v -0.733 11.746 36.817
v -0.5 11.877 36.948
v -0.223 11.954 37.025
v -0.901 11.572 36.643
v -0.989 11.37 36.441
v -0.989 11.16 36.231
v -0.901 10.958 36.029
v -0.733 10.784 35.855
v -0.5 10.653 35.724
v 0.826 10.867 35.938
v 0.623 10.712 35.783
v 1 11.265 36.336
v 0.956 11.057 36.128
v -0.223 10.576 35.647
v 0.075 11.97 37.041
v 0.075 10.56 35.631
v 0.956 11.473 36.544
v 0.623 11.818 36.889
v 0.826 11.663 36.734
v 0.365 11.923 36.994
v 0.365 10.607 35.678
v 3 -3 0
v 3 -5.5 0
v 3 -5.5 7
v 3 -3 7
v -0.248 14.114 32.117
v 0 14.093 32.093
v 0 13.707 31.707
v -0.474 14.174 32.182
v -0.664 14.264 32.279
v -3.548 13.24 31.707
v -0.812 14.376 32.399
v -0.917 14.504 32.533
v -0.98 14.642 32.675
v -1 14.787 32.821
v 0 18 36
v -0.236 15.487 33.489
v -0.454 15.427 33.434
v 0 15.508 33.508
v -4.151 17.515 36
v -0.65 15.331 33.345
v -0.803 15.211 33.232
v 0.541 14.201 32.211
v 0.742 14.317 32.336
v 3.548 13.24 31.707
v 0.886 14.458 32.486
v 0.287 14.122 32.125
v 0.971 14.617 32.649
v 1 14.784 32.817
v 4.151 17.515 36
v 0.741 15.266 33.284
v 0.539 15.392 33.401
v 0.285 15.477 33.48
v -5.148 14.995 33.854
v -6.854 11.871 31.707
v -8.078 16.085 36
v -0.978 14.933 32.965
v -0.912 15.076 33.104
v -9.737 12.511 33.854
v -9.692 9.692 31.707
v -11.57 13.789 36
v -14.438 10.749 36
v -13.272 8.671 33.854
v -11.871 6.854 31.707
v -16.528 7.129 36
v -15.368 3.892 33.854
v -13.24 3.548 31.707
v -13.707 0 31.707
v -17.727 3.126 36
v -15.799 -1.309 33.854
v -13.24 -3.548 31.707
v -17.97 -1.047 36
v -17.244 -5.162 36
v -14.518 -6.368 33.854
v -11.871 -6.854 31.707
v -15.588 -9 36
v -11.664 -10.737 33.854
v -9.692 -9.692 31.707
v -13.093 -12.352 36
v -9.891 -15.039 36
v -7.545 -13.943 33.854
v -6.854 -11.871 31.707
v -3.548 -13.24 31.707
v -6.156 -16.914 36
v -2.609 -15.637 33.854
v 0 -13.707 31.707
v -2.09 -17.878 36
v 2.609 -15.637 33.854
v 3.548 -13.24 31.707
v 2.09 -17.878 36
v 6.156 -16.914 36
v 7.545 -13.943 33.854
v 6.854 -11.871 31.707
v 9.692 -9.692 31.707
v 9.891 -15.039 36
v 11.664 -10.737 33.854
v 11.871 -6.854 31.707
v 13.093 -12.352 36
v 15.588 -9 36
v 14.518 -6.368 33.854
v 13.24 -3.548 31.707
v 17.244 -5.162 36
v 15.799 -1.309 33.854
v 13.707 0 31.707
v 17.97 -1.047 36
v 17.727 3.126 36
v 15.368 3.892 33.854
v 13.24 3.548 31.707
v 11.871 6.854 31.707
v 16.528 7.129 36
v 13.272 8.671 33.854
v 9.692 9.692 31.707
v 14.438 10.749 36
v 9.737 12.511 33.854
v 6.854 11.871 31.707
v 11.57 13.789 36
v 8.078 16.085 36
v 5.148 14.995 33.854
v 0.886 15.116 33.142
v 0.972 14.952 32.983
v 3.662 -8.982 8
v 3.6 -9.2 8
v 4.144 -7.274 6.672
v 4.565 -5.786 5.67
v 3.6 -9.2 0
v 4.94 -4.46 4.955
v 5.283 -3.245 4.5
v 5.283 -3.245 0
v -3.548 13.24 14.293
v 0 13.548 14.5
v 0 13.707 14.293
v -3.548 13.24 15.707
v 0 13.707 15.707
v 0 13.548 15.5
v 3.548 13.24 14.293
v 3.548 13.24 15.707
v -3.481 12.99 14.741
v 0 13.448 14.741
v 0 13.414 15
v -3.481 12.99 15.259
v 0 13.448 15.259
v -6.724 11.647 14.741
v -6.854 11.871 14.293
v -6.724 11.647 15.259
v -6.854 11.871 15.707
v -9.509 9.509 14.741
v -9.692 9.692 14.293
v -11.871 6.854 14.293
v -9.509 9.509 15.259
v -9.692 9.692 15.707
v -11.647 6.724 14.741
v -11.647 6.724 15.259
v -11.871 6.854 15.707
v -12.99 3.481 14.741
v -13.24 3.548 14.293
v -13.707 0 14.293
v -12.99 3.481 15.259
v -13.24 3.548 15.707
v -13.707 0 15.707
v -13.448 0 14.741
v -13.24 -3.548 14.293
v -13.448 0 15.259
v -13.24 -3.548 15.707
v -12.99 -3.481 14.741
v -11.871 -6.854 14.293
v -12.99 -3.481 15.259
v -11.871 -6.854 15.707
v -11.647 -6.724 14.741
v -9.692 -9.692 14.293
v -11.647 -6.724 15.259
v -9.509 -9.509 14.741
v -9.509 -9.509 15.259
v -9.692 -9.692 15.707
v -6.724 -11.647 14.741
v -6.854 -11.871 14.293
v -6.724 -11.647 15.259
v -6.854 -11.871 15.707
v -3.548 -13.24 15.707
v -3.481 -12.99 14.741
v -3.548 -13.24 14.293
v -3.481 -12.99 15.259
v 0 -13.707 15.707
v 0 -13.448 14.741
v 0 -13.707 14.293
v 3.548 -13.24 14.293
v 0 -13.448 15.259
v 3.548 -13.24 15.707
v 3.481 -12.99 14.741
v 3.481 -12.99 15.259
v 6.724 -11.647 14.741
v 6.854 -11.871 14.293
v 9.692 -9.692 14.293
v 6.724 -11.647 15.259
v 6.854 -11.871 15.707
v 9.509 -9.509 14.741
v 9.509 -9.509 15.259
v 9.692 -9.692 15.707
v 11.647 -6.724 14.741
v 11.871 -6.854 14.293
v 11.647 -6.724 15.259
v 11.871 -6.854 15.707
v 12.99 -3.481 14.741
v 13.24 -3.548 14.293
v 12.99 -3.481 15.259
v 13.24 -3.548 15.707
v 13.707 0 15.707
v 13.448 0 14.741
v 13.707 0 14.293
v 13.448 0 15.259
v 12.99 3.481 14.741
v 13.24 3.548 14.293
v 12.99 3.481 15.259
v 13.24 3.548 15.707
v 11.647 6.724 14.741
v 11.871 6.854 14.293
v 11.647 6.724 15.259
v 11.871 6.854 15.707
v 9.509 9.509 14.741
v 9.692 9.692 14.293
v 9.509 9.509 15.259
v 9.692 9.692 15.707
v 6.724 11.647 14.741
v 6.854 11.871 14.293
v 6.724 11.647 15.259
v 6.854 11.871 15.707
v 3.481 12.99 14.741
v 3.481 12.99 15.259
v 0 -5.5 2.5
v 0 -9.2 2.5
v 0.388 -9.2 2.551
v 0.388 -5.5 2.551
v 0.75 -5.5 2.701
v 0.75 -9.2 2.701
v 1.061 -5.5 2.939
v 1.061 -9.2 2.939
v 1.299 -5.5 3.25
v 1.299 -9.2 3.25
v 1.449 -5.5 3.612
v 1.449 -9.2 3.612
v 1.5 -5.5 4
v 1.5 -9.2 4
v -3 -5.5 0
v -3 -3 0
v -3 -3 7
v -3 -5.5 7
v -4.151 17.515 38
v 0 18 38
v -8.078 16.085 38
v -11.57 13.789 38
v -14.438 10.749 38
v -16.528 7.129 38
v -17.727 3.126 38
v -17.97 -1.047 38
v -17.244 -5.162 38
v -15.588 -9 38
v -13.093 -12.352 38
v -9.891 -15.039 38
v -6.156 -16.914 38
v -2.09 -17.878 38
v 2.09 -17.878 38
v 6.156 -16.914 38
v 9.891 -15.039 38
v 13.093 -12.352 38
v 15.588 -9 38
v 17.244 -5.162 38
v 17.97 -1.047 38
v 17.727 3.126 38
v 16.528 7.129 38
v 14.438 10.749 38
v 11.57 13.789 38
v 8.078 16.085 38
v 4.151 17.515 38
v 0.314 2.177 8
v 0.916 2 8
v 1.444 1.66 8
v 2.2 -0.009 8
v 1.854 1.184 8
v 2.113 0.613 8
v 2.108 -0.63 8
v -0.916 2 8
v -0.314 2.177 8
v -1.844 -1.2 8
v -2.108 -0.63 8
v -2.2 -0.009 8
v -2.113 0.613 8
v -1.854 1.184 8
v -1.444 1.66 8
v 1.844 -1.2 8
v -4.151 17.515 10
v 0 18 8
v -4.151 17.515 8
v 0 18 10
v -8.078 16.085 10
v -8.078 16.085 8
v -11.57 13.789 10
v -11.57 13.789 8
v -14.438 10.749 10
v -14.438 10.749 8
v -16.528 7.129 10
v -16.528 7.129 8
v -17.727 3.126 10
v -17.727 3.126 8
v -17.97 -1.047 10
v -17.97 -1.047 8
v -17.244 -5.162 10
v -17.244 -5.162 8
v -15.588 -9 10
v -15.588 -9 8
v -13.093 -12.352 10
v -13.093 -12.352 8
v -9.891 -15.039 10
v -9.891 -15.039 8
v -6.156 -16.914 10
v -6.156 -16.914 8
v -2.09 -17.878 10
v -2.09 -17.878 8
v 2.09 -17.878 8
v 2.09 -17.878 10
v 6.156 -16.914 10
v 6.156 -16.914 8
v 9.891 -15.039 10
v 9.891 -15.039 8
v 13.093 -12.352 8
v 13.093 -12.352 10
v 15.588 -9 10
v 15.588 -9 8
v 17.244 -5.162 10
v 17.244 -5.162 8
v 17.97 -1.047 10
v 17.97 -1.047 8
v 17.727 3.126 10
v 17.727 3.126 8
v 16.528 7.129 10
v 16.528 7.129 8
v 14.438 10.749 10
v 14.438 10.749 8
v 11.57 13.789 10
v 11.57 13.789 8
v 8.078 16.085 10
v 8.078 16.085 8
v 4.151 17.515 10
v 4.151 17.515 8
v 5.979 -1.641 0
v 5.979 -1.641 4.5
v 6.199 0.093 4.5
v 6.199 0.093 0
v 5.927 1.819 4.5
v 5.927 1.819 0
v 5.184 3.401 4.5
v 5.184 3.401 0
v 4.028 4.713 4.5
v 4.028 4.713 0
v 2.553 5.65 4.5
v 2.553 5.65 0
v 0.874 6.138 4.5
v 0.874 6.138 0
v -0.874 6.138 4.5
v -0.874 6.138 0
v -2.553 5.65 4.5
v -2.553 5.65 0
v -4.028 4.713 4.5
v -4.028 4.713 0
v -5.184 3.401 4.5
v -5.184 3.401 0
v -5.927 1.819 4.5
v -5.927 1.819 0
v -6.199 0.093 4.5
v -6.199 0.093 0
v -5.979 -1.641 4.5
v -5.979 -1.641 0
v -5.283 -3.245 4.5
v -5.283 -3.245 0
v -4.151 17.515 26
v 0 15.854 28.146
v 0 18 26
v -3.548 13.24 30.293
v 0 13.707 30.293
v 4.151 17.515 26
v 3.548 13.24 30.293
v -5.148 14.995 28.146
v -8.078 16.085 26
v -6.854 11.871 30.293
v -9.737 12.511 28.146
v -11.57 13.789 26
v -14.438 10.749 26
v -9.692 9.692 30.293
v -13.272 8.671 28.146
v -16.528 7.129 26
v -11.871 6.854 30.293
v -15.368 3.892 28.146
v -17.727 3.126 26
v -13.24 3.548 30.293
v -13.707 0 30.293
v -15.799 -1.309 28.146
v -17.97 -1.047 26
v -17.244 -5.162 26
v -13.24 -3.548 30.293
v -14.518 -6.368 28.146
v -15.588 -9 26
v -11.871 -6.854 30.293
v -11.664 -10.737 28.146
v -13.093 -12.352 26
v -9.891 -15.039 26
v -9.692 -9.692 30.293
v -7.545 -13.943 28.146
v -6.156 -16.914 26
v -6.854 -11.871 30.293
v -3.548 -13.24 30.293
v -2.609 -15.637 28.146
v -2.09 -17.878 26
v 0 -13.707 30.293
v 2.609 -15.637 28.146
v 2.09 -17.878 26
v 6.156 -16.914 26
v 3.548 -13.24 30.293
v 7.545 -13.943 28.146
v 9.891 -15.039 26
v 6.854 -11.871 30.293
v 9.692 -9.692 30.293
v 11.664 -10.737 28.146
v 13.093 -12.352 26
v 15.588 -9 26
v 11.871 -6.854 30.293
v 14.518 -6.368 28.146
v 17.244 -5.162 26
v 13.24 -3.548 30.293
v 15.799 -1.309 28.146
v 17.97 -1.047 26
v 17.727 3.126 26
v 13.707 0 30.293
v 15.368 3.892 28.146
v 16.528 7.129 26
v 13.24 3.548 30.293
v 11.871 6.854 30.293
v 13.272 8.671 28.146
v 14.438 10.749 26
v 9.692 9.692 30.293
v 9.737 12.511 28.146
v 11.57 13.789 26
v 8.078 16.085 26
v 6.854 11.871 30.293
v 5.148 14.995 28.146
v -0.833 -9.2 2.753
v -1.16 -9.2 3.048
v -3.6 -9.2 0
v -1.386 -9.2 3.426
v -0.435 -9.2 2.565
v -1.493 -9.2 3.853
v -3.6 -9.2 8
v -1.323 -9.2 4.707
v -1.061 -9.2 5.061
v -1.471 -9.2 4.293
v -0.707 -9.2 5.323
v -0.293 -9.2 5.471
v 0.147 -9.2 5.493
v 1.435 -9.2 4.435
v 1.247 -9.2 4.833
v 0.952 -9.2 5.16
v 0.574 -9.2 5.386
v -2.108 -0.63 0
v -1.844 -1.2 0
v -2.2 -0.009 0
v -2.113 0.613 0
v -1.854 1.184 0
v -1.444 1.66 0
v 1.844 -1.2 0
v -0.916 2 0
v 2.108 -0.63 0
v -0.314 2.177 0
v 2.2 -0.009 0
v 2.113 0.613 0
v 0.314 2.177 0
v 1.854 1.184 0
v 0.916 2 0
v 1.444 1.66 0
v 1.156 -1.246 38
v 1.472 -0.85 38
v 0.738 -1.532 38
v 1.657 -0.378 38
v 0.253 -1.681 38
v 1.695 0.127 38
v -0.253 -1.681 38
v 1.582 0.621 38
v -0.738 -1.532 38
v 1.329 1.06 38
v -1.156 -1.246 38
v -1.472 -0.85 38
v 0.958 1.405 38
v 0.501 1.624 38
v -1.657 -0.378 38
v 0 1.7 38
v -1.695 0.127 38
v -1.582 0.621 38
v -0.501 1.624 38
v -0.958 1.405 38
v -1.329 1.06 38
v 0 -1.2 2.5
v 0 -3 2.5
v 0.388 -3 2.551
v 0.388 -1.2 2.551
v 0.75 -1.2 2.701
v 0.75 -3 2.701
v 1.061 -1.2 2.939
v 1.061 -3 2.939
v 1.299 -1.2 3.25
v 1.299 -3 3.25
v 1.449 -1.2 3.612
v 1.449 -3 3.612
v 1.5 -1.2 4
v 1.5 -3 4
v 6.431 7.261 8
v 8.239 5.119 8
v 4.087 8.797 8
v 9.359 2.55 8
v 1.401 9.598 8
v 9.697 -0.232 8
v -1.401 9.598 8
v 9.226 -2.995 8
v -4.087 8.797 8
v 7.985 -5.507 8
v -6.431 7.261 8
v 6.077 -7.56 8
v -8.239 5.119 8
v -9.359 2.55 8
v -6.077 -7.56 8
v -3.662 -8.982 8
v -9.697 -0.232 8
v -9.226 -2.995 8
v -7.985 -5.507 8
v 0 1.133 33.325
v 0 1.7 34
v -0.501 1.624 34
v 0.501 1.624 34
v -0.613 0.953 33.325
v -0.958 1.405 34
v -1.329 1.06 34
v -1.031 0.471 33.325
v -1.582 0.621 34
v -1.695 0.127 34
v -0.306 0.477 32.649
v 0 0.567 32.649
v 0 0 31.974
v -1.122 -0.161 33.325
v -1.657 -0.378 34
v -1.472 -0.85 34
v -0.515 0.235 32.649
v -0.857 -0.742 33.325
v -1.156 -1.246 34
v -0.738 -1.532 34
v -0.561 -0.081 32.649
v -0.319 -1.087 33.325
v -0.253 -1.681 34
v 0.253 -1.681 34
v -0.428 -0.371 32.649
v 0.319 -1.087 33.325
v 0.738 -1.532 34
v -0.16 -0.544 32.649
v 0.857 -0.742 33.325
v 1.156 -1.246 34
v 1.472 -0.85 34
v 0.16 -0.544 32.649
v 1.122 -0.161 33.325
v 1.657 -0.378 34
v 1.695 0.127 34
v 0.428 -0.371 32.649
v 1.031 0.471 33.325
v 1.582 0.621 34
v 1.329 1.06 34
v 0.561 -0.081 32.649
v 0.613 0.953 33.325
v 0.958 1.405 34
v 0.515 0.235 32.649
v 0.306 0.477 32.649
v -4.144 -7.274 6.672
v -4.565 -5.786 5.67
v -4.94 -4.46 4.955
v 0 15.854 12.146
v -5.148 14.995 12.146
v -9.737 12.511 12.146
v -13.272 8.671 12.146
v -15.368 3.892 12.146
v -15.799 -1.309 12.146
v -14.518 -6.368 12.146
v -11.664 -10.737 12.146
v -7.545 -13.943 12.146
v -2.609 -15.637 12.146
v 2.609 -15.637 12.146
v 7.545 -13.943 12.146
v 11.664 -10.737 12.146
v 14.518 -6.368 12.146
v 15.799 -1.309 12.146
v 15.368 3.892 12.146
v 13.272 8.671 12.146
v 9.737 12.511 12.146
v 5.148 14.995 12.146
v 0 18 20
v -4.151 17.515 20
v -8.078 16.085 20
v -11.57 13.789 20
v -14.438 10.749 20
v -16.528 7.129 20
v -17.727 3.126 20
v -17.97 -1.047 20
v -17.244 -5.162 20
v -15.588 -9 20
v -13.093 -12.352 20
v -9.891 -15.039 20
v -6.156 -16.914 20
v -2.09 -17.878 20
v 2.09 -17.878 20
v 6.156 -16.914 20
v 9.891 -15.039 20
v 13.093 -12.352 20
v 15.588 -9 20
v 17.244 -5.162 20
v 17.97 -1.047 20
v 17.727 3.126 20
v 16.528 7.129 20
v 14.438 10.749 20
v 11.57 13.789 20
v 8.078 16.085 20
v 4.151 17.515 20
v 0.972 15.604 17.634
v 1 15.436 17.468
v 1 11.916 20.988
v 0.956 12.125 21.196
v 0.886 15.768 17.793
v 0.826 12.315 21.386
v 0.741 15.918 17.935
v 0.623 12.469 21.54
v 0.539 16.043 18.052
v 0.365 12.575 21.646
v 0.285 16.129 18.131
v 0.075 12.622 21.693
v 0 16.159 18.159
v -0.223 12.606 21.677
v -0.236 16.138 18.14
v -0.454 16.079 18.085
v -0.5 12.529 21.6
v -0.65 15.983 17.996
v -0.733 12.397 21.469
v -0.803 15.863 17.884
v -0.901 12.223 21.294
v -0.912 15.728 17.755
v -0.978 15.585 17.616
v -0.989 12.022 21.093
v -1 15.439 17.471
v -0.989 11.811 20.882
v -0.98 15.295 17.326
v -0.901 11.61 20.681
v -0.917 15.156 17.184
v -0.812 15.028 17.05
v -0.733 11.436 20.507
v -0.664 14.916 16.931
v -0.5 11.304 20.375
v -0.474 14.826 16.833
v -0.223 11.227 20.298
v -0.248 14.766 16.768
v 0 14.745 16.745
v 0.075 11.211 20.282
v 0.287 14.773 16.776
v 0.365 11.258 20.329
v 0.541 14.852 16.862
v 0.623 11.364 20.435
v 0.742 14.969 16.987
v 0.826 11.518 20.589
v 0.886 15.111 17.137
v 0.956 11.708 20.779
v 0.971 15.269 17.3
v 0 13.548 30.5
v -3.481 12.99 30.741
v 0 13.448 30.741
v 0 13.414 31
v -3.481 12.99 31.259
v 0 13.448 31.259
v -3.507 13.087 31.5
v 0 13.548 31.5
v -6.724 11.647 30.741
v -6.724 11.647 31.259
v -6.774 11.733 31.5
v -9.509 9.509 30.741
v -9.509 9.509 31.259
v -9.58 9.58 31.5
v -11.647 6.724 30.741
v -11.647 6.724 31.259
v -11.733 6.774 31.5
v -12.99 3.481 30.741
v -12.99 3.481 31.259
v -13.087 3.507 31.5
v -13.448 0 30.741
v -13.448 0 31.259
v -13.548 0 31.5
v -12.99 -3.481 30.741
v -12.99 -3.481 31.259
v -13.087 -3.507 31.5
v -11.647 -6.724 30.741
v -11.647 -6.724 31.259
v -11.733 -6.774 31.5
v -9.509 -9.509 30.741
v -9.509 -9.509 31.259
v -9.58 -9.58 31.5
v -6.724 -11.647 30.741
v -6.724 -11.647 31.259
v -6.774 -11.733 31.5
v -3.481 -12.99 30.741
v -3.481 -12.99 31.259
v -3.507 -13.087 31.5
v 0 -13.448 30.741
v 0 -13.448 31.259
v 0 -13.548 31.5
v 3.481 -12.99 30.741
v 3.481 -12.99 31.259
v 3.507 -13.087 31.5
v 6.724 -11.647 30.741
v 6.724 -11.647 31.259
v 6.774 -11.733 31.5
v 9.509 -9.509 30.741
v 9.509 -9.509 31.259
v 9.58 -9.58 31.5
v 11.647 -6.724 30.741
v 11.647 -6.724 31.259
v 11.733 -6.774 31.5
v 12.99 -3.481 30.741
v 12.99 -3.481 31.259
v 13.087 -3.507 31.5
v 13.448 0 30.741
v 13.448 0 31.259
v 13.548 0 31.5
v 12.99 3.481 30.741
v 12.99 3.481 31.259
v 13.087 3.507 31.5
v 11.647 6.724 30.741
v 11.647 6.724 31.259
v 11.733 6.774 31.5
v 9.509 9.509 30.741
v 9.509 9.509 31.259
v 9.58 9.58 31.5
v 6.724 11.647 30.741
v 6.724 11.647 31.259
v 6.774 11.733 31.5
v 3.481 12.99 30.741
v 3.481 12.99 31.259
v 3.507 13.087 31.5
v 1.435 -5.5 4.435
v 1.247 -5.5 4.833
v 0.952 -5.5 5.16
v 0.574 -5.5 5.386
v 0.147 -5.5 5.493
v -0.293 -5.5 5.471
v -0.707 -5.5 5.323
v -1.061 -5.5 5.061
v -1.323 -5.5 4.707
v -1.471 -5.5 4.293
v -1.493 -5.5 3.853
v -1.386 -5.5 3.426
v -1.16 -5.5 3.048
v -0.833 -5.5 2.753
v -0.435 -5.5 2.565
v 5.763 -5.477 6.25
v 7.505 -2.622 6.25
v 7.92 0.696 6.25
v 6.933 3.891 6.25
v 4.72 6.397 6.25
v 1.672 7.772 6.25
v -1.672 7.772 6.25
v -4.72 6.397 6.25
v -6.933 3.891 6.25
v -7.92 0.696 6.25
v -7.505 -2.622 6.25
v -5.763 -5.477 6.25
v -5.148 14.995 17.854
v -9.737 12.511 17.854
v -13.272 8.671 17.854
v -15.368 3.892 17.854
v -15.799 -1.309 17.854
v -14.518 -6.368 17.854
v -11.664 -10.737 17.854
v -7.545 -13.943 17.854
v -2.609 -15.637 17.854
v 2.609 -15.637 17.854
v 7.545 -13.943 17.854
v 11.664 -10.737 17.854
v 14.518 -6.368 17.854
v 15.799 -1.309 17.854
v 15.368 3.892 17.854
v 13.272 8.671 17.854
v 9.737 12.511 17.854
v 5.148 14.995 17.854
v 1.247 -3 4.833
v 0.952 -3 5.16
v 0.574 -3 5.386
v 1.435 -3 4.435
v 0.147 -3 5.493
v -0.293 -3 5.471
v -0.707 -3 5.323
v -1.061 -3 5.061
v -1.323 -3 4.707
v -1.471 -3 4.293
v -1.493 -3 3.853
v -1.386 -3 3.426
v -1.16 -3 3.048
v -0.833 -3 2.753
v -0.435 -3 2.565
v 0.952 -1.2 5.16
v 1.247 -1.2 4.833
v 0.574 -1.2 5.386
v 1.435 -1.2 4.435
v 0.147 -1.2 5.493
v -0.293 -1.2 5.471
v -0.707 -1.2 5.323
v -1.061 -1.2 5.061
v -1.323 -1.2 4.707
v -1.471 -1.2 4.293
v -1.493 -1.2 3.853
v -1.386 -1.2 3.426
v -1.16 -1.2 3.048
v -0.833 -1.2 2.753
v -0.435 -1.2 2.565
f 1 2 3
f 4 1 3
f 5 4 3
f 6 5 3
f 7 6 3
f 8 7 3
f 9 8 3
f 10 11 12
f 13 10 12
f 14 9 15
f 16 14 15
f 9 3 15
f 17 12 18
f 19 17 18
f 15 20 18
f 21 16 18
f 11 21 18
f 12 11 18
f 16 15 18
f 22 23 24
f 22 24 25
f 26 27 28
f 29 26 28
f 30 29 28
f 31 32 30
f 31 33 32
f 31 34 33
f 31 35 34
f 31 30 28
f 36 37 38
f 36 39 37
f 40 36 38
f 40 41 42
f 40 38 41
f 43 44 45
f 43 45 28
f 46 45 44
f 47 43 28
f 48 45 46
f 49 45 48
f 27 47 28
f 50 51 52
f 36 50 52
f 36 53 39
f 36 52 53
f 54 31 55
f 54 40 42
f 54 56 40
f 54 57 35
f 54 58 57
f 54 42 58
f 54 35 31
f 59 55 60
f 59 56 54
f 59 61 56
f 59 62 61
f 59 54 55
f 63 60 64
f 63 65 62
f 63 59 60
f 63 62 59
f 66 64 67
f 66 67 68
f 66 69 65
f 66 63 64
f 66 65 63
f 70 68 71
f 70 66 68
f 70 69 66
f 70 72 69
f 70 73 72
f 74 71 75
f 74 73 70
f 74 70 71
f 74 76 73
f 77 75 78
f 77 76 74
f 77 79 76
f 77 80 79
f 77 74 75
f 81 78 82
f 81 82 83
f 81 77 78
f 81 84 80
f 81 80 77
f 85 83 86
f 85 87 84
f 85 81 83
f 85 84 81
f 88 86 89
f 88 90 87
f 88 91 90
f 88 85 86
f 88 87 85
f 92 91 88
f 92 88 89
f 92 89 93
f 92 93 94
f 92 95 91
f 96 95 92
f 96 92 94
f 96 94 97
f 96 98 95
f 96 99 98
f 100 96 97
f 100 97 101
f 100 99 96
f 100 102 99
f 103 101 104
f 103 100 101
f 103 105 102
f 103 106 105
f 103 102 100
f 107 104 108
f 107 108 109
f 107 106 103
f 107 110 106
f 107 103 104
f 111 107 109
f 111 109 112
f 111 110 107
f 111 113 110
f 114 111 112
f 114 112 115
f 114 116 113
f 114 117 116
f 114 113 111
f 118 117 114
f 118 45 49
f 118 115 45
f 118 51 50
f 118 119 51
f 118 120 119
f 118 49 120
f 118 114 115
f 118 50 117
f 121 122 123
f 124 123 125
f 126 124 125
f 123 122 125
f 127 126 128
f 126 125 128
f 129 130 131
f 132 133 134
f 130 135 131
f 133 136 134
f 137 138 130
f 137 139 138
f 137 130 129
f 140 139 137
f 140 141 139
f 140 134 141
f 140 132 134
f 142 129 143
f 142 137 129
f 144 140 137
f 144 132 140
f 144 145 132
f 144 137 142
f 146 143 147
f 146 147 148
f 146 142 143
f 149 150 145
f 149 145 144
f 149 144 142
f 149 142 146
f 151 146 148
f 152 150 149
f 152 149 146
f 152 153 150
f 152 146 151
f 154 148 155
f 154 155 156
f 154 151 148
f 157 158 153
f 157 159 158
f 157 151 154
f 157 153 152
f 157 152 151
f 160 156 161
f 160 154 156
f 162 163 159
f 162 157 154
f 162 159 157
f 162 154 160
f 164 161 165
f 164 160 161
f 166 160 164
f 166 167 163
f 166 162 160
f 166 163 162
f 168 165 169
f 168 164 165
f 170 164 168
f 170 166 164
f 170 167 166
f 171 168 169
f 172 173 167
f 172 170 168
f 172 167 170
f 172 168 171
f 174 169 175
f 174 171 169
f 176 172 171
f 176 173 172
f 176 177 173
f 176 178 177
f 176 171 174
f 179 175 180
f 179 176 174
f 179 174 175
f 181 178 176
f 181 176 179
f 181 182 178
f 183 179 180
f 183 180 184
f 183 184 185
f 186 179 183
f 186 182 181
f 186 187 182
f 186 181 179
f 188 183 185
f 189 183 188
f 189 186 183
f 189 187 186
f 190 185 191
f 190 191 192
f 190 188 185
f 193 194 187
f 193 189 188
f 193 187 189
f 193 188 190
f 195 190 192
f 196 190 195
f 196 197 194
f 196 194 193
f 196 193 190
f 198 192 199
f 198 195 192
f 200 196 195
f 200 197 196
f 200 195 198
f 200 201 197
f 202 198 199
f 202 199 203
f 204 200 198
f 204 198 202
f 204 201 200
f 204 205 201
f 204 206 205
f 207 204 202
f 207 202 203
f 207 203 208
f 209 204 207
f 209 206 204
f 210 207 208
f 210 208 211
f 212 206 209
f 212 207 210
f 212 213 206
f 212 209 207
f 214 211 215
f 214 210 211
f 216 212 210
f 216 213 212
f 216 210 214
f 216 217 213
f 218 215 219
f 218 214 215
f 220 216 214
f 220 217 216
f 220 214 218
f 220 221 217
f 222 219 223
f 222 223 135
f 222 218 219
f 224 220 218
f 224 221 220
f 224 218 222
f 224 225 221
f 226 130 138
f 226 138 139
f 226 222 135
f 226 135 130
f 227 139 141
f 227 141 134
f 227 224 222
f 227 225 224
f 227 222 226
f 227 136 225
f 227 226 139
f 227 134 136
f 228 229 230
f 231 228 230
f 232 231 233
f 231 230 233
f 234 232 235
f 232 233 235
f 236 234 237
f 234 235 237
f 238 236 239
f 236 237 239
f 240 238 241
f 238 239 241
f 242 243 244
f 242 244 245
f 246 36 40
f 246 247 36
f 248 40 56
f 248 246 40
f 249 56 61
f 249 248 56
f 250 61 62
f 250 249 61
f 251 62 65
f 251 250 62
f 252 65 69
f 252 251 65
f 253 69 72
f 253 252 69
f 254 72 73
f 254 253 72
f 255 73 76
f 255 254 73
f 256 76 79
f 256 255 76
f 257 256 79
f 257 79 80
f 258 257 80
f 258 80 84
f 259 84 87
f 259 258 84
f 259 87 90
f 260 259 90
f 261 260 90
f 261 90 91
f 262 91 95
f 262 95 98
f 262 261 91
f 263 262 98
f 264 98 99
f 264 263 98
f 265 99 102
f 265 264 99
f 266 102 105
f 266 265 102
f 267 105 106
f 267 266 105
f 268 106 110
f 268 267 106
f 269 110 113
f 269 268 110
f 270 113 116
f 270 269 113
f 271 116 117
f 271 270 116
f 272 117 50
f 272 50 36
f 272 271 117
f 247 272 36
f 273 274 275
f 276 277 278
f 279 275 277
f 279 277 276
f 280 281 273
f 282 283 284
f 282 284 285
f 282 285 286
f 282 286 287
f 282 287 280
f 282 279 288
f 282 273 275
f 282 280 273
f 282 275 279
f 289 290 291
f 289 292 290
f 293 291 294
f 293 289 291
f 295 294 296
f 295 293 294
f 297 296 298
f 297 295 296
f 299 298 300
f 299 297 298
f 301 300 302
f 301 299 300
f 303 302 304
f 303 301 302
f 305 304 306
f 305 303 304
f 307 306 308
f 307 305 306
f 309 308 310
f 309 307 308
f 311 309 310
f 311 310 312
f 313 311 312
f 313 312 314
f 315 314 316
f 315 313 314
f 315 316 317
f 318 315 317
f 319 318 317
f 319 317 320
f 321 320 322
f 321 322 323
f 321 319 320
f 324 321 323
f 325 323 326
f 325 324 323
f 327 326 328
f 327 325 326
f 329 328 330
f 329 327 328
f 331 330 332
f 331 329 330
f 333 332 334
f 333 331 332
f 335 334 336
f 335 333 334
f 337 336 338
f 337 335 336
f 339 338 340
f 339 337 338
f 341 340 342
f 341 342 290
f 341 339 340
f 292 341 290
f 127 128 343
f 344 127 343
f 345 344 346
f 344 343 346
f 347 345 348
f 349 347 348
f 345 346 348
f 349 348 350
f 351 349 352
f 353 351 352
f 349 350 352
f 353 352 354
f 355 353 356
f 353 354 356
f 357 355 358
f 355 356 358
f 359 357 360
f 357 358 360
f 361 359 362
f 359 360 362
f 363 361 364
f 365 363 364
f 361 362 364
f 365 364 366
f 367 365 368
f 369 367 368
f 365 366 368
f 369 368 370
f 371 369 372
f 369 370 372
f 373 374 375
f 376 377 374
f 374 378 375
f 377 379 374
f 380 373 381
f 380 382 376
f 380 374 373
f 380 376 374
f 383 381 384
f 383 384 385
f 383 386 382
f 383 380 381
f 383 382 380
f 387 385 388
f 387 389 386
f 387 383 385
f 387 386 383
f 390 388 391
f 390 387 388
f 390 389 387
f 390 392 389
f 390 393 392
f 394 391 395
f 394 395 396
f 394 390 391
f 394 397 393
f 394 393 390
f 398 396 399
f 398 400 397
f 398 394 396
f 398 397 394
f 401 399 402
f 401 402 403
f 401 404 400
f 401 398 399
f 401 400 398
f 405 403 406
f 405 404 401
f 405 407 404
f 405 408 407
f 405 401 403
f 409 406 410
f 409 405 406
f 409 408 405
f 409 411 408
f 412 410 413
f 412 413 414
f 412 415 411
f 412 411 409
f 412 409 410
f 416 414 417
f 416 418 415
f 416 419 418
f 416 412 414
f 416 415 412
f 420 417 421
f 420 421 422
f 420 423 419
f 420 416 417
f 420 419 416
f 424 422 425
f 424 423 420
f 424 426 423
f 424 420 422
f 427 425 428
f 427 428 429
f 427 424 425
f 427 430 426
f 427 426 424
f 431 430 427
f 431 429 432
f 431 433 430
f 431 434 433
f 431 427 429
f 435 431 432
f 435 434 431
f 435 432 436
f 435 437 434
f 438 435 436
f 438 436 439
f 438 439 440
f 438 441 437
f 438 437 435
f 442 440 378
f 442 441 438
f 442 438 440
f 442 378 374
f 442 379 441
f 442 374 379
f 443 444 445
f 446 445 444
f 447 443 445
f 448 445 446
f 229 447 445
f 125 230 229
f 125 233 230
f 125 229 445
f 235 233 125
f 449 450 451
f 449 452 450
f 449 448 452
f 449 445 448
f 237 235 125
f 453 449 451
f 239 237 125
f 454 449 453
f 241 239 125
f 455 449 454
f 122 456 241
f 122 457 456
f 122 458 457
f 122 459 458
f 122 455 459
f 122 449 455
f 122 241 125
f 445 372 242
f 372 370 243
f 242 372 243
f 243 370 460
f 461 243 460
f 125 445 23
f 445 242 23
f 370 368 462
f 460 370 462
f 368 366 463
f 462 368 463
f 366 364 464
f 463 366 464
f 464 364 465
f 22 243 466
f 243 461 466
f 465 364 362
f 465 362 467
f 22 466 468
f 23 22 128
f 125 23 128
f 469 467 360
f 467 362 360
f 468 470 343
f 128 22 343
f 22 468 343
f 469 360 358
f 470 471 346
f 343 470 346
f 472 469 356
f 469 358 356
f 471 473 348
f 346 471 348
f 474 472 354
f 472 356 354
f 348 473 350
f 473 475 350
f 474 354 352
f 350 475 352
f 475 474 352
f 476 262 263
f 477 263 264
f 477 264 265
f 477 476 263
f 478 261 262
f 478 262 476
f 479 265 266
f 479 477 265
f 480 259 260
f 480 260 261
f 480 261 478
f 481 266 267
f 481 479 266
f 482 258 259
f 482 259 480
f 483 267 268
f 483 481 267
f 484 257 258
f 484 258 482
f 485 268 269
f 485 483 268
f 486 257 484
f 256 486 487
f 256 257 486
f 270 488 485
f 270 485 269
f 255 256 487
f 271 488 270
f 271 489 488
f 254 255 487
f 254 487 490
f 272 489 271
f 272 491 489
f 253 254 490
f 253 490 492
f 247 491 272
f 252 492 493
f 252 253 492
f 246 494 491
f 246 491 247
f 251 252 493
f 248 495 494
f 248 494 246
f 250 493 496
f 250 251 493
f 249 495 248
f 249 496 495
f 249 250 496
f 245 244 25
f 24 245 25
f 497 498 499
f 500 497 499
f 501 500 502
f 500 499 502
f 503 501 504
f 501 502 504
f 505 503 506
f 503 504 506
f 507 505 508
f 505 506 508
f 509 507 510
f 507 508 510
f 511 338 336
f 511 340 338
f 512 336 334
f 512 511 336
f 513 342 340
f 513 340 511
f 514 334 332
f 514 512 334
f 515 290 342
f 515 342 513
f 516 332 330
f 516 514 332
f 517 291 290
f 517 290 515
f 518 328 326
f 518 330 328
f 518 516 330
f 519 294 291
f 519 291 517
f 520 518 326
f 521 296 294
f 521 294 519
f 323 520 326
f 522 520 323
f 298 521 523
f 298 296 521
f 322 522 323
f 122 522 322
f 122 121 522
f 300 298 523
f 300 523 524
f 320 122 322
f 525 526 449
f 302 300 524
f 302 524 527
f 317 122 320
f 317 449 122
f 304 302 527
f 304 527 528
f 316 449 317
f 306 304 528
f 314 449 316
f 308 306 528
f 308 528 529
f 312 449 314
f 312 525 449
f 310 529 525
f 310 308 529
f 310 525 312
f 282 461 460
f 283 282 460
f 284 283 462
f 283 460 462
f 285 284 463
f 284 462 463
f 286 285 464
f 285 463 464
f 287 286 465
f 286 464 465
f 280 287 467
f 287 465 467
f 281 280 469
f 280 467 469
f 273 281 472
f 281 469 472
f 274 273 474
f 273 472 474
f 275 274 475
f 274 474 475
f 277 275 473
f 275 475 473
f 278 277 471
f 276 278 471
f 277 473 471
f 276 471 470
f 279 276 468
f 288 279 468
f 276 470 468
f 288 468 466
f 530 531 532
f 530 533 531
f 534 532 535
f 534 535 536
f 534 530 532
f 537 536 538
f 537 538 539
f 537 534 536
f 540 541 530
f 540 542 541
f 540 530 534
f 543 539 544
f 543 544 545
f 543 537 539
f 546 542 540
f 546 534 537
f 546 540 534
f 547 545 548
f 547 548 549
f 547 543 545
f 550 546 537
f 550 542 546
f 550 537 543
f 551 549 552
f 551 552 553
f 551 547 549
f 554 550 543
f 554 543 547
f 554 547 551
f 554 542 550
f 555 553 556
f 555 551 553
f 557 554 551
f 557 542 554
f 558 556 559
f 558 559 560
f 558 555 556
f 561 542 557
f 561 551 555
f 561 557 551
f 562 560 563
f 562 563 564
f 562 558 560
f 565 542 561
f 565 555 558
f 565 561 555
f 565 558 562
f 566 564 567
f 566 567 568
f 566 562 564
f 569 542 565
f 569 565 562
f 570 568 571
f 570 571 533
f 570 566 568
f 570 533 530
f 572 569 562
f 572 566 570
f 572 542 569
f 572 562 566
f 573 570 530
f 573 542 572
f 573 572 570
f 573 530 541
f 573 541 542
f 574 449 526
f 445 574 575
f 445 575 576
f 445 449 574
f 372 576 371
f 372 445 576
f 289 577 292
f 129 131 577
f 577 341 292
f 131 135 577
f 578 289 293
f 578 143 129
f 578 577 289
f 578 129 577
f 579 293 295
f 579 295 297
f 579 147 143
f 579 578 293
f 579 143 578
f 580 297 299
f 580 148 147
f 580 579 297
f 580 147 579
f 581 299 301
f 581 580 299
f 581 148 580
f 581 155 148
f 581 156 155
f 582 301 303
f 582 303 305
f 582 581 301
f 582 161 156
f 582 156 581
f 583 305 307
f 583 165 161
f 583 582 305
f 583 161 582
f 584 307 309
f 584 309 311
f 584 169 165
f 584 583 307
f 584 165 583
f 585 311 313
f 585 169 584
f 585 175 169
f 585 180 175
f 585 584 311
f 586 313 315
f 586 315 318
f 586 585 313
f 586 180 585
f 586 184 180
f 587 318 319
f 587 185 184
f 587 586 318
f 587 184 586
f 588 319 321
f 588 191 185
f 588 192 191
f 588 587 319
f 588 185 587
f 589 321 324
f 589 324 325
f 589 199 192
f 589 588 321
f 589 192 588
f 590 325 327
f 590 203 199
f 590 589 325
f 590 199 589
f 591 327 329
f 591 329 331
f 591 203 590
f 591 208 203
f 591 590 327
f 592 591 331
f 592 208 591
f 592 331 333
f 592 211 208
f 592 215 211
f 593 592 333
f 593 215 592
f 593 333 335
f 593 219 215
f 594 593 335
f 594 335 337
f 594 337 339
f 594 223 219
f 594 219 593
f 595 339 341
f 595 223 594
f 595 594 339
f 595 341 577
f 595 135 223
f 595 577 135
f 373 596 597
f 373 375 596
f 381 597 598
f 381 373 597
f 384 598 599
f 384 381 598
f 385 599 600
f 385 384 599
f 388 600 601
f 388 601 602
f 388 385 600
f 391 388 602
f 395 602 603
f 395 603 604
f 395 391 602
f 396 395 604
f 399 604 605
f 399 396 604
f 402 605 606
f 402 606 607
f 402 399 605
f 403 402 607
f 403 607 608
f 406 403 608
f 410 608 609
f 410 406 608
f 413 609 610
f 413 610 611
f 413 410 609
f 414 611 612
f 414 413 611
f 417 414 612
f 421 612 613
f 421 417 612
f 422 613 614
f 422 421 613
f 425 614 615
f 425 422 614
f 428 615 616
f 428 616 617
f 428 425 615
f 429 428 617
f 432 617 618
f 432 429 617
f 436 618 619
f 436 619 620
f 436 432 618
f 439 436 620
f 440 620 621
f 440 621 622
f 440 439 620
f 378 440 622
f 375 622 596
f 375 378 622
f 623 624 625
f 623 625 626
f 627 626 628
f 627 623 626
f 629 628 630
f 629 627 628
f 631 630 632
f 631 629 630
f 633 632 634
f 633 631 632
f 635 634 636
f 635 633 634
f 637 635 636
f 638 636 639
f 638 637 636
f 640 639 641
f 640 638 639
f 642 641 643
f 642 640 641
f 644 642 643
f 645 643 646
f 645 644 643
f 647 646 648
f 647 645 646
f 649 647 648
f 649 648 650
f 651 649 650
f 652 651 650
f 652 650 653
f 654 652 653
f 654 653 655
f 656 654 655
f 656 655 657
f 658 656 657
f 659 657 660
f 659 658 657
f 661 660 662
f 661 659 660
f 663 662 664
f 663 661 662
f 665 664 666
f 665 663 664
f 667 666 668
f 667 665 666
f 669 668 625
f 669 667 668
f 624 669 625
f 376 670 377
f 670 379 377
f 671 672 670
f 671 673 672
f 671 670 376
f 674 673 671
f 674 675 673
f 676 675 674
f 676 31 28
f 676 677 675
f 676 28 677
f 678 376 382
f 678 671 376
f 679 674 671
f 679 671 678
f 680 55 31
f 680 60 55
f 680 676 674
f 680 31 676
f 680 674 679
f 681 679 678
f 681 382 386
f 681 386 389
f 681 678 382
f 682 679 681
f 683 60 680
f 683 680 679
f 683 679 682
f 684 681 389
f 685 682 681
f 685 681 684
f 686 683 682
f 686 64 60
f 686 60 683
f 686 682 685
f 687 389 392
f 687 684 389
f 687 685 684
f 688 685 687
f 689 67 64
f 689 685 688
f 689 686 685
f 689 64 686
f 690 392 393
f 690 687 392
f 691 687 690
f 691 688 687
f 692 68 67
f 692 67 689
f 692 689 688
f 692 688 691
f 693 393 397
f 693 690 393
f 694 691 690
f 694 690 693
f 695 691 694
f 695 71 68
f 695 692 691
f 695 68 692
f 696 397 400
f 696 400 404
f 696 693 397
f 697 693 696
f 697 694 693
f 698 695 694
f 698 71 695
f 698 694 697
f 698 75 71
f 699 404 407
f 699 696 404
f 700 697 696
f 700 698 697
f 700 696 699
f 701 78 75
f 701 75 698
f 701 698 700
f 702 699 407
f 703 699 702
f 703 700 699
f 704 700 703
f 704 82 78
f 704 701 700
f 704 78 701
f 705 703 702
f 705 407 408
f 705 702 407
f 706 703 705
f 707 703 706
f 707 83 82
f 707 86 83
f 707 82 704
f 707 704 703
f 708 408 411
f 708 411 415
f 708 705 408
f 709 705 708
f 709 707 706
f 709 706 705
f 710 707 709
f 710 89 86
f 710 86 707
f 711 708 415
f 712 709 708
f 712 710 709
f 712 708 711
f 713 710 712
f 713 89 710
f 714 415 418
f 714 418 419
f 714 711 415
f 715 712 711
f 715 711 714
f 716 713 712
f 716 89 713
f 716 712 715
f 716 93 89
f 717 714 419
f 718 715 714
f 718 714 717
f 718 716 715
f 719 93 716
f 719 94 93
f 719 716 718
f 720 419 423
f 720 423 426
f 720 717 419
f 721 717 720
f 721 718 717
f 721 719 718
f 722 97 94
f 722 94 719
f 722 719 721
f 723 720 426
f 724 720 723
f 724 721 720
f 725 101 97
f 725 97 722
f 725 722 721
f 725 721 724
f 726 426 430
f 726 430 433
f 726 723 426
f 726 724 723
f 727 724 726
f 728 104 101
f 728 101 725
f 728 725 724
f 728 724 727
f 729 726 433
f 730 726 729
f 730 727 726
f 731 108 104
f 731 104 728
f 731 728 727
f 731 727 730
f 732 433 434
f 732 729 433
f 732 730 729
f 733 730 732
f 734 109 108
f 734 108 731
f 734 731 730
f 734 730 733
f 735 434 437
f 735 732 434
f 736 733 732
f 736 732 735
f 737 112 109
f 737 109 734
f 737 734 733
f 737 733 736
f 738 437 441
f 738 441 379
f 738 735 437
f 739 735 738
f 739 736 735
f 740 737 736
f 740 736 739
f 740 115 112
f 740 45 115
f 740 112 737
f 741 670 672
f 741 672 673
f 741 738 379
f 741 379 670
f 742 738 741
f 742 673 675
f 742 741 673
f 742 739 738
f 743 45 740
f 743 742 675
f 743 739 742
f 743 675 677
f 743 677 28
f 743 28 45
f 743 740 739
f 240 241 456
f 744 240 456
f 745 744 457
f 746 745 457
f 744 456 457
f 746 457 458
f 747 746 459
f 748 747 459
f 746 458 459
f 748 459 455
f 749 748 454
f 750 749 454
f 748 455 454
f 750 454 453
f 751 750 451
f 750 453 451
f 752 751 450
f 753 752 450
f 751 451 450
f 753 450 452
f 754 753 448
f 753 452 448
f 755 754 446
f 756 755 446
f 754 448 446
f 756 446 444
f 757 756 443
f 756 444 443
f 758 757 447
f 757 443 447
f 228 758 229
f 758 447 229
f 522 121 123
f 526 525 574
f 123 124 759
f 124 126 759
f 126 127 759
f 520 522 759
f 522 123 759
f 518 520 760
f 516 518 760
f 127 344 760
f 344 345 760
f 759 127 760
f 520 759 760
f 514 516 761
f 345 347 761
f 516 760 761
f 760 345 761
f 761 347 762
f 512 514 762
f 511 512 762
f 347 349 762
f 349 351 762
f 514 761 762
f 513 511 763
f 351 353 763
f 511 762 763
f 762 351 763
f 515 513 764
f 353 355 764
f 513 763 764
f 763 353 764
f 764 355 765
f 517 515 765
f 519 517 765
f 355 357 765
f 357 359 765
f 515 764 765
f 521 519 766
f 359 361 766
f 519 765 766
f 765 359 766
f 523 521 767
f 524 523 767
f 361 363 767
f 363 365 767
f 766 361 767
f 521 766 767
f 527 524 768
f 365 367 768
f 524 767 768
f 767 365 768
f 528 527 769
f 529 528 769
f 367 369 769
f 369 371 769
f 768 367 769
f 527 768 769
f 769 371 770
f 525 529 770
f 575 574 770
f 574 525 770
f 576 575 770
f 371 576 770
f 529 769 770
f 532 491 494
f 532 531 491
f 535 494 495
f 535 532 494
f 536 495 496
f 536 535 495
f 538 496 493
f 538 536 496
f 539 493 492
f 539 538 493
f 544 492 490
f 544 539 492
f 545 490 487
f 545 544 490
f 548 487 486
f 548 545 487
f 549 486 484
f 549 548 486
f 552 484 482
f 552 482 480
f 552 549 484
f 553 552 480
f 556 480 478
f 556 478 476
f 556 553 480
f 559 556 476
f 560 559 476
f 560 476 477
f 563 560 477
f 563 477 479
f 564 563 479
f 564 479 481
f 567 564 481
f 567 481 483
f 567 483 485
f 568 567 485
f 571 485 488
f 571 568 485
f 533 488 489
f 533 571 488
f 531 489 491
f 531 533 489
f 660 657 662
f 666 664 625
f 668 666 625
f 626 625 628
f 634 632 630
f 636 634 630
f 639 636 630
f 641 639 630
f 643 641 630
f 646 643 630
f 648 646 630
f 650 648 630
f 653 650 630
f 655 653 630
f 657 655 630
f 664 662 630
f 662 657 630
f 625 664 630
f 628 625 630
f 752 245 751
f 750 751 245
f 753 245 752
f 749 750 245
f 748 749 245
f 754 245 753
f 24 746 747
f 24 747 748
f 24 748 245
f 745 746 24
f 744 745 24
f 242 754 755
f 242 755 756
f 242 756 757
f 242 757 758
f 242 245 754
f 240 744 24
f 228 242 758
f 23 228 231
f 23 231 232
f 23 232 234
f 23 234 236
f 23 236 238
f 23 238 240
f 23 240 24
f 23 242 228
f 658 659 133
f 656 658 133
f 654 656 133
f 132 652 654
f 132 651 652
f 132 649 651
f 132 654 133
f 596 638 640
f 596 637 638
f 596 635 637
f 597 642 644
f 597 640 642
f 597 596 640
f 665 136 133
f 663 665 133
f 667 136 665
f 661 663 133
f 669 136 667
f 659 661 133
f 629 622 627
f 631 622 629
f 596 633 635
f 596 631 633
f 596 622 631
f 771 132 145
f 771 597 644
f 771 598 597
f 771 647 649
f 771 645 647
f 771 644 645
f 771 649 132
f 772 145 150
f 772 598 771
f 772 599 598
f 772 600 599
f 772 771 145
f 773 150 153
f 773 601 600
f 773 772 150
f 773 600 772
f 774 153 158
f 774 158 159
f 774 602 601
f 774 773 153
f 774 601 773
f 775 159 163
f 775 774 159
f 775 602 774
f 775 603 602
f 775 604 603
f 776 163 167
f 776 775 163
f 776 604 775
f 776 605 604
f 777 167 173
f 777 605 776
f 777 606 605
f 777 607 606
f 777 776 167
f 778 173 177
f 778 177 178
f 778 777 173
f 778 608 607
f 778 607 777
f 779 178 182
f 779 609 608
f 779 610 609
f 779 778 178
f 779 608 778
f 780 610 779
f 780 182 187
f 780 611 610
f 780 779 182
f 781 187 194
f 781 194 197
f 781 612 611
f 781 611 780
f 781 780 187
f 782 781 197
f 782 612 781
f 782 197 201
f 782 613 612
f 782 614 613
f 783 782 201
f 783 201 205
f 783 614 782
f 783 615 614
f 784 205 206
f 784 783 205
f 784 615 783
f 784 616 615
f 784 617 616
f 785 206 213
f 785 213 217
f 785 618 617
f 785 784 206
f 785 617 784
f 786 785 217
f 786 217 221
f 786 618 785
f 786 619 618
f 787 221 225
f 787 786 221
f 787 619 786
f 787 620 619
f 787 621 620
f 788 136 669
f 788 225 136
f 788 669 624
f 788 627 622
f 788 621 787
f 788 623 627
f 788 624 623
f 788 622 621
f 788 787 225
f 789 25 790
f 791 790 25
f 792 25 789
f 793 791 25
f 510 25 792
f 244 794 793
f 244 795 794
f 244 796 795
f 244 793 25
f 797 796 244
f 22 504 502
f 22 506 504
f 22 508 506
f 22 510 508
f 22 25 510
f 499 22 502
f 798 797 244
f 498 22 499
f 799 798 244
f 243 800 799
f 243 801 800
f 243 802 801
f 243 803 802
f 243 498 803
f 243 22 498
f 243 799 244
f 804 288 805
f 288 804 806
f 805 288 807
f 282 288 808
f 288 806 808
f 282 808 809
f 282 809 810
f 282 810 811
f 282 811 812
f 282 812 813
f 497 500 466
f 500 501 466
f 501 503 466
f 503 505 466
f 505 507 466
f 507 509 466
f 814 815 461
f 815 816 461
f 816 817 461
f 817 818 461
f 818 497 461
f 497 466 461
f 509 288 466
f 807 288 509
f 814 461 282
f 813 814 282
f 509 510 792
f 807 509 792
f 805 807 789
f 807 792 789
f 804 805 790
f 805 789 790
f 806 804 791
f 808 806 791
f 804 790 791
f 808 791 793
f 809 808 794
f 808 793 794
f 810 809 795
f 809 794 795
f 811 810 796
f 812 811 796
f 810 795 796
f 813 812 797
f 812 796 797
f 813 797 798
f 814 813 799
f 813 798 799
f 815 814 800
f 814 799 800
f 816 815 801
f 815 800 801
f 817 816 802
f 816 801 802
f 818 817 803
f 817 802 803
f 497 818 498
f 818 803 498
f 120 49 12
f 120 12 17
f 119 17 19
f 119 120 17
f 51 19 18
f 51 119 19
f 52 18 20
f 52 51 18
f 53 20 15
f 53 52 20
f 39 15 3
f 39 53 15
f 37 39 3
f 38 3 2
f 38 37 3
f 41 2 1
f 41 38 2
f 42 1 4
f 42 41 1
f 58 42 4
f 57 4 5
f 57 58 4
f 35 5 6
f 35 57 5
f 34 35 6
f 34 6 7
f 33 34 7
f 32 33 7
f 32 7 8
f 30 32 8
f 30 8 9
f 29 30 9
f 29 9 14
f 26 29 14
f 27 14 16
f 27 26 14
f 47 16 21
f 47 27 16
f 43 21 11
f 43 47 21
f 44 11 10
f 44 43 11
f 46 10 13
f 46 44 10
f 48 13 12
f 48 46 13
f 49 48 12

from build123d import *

# Parameters (mm, degrees)
F1_DEPTH     = 8
F3_W         = 6.7527772065
F3_H         = 8
F4_DEPTH     = 4
F8_DEPTH     = 7
F9_T4_DEPTH  = 8
F9_T9_DEPTH  = 20.6550440955
F9_T15_DEPTH = 20.6550440955
F9_T21_DEPTH = 8
F9_T26_DEPTH = 20.6550440955
F9_T32_DEPTH = 20.6550440955
F12_DEPTH    = 8
F13_SIZE     = 3.5
F16_R        = 1
F17_DEPTH    = 5
F20_R        = 1
F21_DEPTH    = 5


# Not quite as in the source:
# - a fillet or chamfer that OpenCascade refuses, or shapes differently, is made with other operations: its cross-section is extruded or revolved along the edge and cut away or added


with BuildPart() as f1:
    # F0 (on Top) → F1 (new body)
    with BuildSketch(Plane.XY):
        with BuildLine():
            Line((-3.3763886032, -5.2), (3.3763886032, -5.2))
            ThreePointArc((3.3763886032, -5.2), (0, 6.2), (-3.3763886032, -5.2))
        make_face()
        with BuildLine():
            ThreePointArc((-1.8439088915, -1.2), (0, 2.2), (1.8439088915, -1.2))
            Line((1.8439088915, -1.2), (-1.8439088915, -1.2))
        make_face(mode=Mode.SUBTRACT)
    extrude(amount=F1_DEPTH)

    # F3 (on offset) → F4 (join)
    with BuildSketch(Plane.XZ.offset(5.2)):
        with Locations((0, 4)):
            Rectangle(F3_W, F3_H)
    extrude(amount=F4_DEPTH)

    # F6 (on Right) → F7 (revolve)
    with BuildSketch(Plane.YZ):
        with BuildLine():
            Line((18, 36), (18, 38))
            Line((18, 38), (1.7, 38))
            Line((1.7, 38), (1.7, 34))
            Line((1.7, 34), (0, 31.9740188926))
            Line((0, 31.9740188926), (0, 8))
            Line((0, 8), (18, 8))
            Line((18, 8), (18, 10))
            Line((18, 10), (13.7071067812, 14.2928932188))
            ThreePointArc((13.7071067812, 14.2928932188), (13.4142135624, 15), (13.7071067812, 15.7071067812))
            Line((13.7071067812, 15.7071067812), (18, 20))
            Line((18, 20), (18, 26))
            Line((18, 26), (13.7071067812, 30.2928932188))
            ThreePointArc((13.7071067812, 30.2928932188), (13.4142135624, 31), (13.7071067812, 31.7071067812))
            Line((13.7071067812, 31.7071067812), (18, 36))
        make_face()
    revolve(axis=Axis((0, 0, 19.9870094463), (0, 0, 1)))

    # F5 (on Top) → F8 (cut)
    with BuildSketch(Plane.XY):
        Polygon((3, -5.5), (3, -3), (0, -3), (-3, -3), (-3, -5.5), align=None)
    extrude(amount=F8_DEPTH, mode=Mode.SUBTRACT)

    # F9: chamfer of 7 on 2 edges, made by hand


with BuildPart() as f9_tool2:
    # F9_s3 → F9_t4 (new body)
    with BuildSketch(Plane.XY):
        with BuildLine():
            Line((-3.3002459804, -10.261444939), (-5.3591596162, -2.9755066267))
            Line((-5.3591596162, -2.9755066267), (-5.2398656841, -2.9022334545))
            ThreePointArc((-5.2398656841, -2.9022334545), (-4.424549602, -4.1408888924), (-3.3001475703, -5.0825806452))
            Line((-3.3001475703, -5.0825806452), (-3.2363886032, -5.2))
            ThreePointArc((-3.2363886032, -5.2), (-3.2363886032, -7.7307224695), (-3.1602459804, -10.261444939))
            Line((-3.1602459804, -10.261444939), (-3.3002459804, -10.261444939))
        make_face()
    extrude(amount=F9_T4_DEPTH)

    split(bisect_by=Plane.XZ.offset(9.2), keep=Keep.BOTTOM)


with BuildPart() as f1_1:
    add(f1.part)

    # F9_t1: union F9_tool2
    add(f9_tool2.part)


with BuildPart() as f9_tool7:
    # F9_s8 → F9_t9 (new body)
    with BuildSketch(Plane.XY):
        with BuildLine():
            Line((-3.3002459804, -10.261444939), (-5.3591596162, -2.9755066267))
            Line((-5.3591596162, -2.9755066267), (-5.2398656841, -2.9022334545))
            ThreePointArc((-5.2398656841, -2.9022334545), (-4.424549602, -4.1408888924), (-3.3001475703, -5.0825806452))
            Line((-3.3001475703, -5.0825806452), (-3.2363886032, -5.2))
            ThreePointArc((-3.2363886032, -5.2), (-3.2363886032, -7.7307224695), (-3.1602459804, -10.261444939))
            Line((-3.1602459804, -10.261444939), (-3.3002459804, -10.261444939))
        make_face()
    extrude(amount=F9_T9_DEPTH)

    split(bisect_by=Plane.XY.offset(8), keep=Keep.TOP)

    split(bisect_by=Plane.XZ.offset(9.2), keep=Keep.TOP)


with BuildPart() as f1_2:
    add(f1_1.part)

    # F9_t6: union F9_tool7
    add(f9_tool7.part)


with BuildPart() as f9_tool13:
    # F9_s14 → F9_t15 (new body)
    with BuildSketch(Plane.XY):
        with BuildLine():
            Line((-3.3002459804, -10.261444939), (-5.3591596162, -2.9755066267))
            Line((-5.3591596162, -2.9755066267), (-5.2398656841, -2.9022334545))
            ThreePointArc((-5.2398656841, -2.9022334545), (-4.424549602, -4.1408888924), (-3.3001475703, -5.0825806452))
            Line((-3.3001475703, -5.0825806452), (-3.2363886032, -5.2))
            ThreePointArc((-3.2363886032, -5.2), (-3.2363886032, -7.7307224695), (-3.1602459804, -10.261444939))
            Line((-3.1602459804, -10.261444939), (-3.3002459804, -10.261444939))
        make_face()
    extrude(amount=F9_T15_DEPTH)

    split(bisect_by=Plane.XY.offset(8), keep=Keep.TOP)

    split(bisect_by=Plane.XZ.offset(9.2), keep=Keep.BOTTOM)


with BuildPart() as f1_3:
    add(f1_2.part)

    # F9_t12: union F9_tool13
    add(f9_tool13.part)


with BuildPart() as f9_tool19:
    # F9_s20 → F9_t21 (new body)
    with BuildSketch(Plane.XY):
        with BuildLine():
            Line((3.3002459804, -10.261444939), (5.3591596162, -2.9755066267))
            Line((5.3591596162, -2.9755066267), (5.2398656841, -2.9022334545))
            ThreePointArc((5.2398656841, -2.9022334545), (4.424549602, -4.1408888924), (3.3001475703, -5.0825806452))
            Line((3.3001475703, -5.0825806452), (3.2363886032, -5.2))
            ThreePointArc((3.2363886032, -5.2), (3.2363886032, -7.7307224695), (3.1602459804, -10.261444939))
            Line((3.1602459804, -10.261444939), (3.3002459804, -10.261444939))
        make_face()
    extrude(amount=F9_T21_DEPTH)

    split(bisect_by=Plane.XZ.offset(9.2), keep=Keep.BOTTOM)


with BuildPart() as f1_4:
    add(f1_3.part)

    # F9_t18: union F9_tool19
    add(f9_tool19.part)


with BuildPart() as f9_tool24:
    # F9_s25 → F9_t26 (new body)
    with BuildSketch(Plane.XY):
        with BuildLine():
            Line((3.3002459804, -10.261444939), (5.3591596162, -2.9755066267))
            Line((5.3591596162, -2.9755066267), (5.2398656841, -2.9022334545))
            ThreePointArc((5.2398656841, -2.9022334545), (4.424549602, -4.1408888924), (3.3001475703, -5.0825806452))
            Line((3.3001475703, -5.0825806452), (3.2363886032, -5.2))
            ThreePointArc((3.2363886032, -5.2), (3.2363886032, -7.7307224695), (3.1602459804, -10.261444939))
            Line((3.1602459804, -10.261444939), (3.3002459804, -10.261444939))
        make_face()
    extrude(amount=F9_T26_DEPTH)

    split(bisect_by=Plane.XY.offset(8), keep=Keep.TOP)

    split(bisect_by=Plane.XZ.offset(9.2), keep=Keep.TOP)


with BuildPart() as f1_5:
    add(f1_4.part)

    # F9_t23: union F9_tool24
    add(f9_tool24.part)


with BuildPart() as f9_tool30:
    # F9_s31 → F9_t32 (new body)
    with BuildSketch(Plane.XY):
        with BuildLine():
            Line((3.3002459804, -10.261444939), (5.3591596162, -2.9755066267))
            Line((5.3591596162, -2.9755066267), (5.2398656841, -2.9022334545))
            ThreePointArc((5.2398656841, -2.9022334545), (4.424549602, -4.1408888924), (3.3001475703, -5.0825806452))
            Line((3.3001475703, -5.0825806452), (3.2363886032, -5.2))
            ThreePointArc((3.2363886032, -5.2), (3.2363886032, -7.7307224695), (3.1602459804, -10.261444939))
            Line((3.1602459804, -10.261444939), (3.3002459804, -10.261444939))
        make_face()
    extrude(amount=F9_T32_DEPTH)

    split(bisect_by=Plane.XY.offset(8), keep=Keep.TOP)

    split(bisect_by=Plane.XZ.offset(9.2), keep=Keep.BOTTOM)


with BuildPart() as f1_6:
    add(f1_5.part)

    # F9_t29: union F9_tool30
    add(f9_tool30.part)

    # F11 (on offset) → F12 (cut, through all)
    with BuildSketch(Plane.XZ.offset(9.2)):
        with BuildLine():
            ThreePointArc((0, 2.5), (1.0606601718, 2.9393398282), (1.5, 4))
            ThreePointArc((1.5, 4), (-1.0606601718, 5.0606601718), (0, 2.5))
        make_face()
    extrude(amount=-F12_DEPTH, mode=Mode.SUBTRACT)

    # F13
    f13_edges = [f1_6.edges().sort_by_distance(p)[0] for p in [
        (0, 6.2, 8),
    ]]
    chamfer(f13_edges, length=F13_SIZE)

    # F16 (on face) → F17 (cut)
    with BuildSketch(Plane(origin=(0, -1, 1), x_dir=(1, 0, 0), z_dir=(0, -0.7071067812, 0.7071067812))):
        with Locations((0, 23.2666600496)):
            Circle(F16_R)
    extrude(amount=F17_DEPTH, mode=Mode.SUBTRACT)

    # F20 (on face) → F21 (cut)
    with BuildSketch(Plane(origin=(0, -9, 9), x_dir=(1, 0, 0), z_dir=(0, -0.7071067812, 0.7071067812))):
        with Locations((0, 33.659003675)):
            Circle(F20_R)
    extrude(amount=F21_DEPTH, mode=Mode.SUBTRACT)


solid = f1_6.part
